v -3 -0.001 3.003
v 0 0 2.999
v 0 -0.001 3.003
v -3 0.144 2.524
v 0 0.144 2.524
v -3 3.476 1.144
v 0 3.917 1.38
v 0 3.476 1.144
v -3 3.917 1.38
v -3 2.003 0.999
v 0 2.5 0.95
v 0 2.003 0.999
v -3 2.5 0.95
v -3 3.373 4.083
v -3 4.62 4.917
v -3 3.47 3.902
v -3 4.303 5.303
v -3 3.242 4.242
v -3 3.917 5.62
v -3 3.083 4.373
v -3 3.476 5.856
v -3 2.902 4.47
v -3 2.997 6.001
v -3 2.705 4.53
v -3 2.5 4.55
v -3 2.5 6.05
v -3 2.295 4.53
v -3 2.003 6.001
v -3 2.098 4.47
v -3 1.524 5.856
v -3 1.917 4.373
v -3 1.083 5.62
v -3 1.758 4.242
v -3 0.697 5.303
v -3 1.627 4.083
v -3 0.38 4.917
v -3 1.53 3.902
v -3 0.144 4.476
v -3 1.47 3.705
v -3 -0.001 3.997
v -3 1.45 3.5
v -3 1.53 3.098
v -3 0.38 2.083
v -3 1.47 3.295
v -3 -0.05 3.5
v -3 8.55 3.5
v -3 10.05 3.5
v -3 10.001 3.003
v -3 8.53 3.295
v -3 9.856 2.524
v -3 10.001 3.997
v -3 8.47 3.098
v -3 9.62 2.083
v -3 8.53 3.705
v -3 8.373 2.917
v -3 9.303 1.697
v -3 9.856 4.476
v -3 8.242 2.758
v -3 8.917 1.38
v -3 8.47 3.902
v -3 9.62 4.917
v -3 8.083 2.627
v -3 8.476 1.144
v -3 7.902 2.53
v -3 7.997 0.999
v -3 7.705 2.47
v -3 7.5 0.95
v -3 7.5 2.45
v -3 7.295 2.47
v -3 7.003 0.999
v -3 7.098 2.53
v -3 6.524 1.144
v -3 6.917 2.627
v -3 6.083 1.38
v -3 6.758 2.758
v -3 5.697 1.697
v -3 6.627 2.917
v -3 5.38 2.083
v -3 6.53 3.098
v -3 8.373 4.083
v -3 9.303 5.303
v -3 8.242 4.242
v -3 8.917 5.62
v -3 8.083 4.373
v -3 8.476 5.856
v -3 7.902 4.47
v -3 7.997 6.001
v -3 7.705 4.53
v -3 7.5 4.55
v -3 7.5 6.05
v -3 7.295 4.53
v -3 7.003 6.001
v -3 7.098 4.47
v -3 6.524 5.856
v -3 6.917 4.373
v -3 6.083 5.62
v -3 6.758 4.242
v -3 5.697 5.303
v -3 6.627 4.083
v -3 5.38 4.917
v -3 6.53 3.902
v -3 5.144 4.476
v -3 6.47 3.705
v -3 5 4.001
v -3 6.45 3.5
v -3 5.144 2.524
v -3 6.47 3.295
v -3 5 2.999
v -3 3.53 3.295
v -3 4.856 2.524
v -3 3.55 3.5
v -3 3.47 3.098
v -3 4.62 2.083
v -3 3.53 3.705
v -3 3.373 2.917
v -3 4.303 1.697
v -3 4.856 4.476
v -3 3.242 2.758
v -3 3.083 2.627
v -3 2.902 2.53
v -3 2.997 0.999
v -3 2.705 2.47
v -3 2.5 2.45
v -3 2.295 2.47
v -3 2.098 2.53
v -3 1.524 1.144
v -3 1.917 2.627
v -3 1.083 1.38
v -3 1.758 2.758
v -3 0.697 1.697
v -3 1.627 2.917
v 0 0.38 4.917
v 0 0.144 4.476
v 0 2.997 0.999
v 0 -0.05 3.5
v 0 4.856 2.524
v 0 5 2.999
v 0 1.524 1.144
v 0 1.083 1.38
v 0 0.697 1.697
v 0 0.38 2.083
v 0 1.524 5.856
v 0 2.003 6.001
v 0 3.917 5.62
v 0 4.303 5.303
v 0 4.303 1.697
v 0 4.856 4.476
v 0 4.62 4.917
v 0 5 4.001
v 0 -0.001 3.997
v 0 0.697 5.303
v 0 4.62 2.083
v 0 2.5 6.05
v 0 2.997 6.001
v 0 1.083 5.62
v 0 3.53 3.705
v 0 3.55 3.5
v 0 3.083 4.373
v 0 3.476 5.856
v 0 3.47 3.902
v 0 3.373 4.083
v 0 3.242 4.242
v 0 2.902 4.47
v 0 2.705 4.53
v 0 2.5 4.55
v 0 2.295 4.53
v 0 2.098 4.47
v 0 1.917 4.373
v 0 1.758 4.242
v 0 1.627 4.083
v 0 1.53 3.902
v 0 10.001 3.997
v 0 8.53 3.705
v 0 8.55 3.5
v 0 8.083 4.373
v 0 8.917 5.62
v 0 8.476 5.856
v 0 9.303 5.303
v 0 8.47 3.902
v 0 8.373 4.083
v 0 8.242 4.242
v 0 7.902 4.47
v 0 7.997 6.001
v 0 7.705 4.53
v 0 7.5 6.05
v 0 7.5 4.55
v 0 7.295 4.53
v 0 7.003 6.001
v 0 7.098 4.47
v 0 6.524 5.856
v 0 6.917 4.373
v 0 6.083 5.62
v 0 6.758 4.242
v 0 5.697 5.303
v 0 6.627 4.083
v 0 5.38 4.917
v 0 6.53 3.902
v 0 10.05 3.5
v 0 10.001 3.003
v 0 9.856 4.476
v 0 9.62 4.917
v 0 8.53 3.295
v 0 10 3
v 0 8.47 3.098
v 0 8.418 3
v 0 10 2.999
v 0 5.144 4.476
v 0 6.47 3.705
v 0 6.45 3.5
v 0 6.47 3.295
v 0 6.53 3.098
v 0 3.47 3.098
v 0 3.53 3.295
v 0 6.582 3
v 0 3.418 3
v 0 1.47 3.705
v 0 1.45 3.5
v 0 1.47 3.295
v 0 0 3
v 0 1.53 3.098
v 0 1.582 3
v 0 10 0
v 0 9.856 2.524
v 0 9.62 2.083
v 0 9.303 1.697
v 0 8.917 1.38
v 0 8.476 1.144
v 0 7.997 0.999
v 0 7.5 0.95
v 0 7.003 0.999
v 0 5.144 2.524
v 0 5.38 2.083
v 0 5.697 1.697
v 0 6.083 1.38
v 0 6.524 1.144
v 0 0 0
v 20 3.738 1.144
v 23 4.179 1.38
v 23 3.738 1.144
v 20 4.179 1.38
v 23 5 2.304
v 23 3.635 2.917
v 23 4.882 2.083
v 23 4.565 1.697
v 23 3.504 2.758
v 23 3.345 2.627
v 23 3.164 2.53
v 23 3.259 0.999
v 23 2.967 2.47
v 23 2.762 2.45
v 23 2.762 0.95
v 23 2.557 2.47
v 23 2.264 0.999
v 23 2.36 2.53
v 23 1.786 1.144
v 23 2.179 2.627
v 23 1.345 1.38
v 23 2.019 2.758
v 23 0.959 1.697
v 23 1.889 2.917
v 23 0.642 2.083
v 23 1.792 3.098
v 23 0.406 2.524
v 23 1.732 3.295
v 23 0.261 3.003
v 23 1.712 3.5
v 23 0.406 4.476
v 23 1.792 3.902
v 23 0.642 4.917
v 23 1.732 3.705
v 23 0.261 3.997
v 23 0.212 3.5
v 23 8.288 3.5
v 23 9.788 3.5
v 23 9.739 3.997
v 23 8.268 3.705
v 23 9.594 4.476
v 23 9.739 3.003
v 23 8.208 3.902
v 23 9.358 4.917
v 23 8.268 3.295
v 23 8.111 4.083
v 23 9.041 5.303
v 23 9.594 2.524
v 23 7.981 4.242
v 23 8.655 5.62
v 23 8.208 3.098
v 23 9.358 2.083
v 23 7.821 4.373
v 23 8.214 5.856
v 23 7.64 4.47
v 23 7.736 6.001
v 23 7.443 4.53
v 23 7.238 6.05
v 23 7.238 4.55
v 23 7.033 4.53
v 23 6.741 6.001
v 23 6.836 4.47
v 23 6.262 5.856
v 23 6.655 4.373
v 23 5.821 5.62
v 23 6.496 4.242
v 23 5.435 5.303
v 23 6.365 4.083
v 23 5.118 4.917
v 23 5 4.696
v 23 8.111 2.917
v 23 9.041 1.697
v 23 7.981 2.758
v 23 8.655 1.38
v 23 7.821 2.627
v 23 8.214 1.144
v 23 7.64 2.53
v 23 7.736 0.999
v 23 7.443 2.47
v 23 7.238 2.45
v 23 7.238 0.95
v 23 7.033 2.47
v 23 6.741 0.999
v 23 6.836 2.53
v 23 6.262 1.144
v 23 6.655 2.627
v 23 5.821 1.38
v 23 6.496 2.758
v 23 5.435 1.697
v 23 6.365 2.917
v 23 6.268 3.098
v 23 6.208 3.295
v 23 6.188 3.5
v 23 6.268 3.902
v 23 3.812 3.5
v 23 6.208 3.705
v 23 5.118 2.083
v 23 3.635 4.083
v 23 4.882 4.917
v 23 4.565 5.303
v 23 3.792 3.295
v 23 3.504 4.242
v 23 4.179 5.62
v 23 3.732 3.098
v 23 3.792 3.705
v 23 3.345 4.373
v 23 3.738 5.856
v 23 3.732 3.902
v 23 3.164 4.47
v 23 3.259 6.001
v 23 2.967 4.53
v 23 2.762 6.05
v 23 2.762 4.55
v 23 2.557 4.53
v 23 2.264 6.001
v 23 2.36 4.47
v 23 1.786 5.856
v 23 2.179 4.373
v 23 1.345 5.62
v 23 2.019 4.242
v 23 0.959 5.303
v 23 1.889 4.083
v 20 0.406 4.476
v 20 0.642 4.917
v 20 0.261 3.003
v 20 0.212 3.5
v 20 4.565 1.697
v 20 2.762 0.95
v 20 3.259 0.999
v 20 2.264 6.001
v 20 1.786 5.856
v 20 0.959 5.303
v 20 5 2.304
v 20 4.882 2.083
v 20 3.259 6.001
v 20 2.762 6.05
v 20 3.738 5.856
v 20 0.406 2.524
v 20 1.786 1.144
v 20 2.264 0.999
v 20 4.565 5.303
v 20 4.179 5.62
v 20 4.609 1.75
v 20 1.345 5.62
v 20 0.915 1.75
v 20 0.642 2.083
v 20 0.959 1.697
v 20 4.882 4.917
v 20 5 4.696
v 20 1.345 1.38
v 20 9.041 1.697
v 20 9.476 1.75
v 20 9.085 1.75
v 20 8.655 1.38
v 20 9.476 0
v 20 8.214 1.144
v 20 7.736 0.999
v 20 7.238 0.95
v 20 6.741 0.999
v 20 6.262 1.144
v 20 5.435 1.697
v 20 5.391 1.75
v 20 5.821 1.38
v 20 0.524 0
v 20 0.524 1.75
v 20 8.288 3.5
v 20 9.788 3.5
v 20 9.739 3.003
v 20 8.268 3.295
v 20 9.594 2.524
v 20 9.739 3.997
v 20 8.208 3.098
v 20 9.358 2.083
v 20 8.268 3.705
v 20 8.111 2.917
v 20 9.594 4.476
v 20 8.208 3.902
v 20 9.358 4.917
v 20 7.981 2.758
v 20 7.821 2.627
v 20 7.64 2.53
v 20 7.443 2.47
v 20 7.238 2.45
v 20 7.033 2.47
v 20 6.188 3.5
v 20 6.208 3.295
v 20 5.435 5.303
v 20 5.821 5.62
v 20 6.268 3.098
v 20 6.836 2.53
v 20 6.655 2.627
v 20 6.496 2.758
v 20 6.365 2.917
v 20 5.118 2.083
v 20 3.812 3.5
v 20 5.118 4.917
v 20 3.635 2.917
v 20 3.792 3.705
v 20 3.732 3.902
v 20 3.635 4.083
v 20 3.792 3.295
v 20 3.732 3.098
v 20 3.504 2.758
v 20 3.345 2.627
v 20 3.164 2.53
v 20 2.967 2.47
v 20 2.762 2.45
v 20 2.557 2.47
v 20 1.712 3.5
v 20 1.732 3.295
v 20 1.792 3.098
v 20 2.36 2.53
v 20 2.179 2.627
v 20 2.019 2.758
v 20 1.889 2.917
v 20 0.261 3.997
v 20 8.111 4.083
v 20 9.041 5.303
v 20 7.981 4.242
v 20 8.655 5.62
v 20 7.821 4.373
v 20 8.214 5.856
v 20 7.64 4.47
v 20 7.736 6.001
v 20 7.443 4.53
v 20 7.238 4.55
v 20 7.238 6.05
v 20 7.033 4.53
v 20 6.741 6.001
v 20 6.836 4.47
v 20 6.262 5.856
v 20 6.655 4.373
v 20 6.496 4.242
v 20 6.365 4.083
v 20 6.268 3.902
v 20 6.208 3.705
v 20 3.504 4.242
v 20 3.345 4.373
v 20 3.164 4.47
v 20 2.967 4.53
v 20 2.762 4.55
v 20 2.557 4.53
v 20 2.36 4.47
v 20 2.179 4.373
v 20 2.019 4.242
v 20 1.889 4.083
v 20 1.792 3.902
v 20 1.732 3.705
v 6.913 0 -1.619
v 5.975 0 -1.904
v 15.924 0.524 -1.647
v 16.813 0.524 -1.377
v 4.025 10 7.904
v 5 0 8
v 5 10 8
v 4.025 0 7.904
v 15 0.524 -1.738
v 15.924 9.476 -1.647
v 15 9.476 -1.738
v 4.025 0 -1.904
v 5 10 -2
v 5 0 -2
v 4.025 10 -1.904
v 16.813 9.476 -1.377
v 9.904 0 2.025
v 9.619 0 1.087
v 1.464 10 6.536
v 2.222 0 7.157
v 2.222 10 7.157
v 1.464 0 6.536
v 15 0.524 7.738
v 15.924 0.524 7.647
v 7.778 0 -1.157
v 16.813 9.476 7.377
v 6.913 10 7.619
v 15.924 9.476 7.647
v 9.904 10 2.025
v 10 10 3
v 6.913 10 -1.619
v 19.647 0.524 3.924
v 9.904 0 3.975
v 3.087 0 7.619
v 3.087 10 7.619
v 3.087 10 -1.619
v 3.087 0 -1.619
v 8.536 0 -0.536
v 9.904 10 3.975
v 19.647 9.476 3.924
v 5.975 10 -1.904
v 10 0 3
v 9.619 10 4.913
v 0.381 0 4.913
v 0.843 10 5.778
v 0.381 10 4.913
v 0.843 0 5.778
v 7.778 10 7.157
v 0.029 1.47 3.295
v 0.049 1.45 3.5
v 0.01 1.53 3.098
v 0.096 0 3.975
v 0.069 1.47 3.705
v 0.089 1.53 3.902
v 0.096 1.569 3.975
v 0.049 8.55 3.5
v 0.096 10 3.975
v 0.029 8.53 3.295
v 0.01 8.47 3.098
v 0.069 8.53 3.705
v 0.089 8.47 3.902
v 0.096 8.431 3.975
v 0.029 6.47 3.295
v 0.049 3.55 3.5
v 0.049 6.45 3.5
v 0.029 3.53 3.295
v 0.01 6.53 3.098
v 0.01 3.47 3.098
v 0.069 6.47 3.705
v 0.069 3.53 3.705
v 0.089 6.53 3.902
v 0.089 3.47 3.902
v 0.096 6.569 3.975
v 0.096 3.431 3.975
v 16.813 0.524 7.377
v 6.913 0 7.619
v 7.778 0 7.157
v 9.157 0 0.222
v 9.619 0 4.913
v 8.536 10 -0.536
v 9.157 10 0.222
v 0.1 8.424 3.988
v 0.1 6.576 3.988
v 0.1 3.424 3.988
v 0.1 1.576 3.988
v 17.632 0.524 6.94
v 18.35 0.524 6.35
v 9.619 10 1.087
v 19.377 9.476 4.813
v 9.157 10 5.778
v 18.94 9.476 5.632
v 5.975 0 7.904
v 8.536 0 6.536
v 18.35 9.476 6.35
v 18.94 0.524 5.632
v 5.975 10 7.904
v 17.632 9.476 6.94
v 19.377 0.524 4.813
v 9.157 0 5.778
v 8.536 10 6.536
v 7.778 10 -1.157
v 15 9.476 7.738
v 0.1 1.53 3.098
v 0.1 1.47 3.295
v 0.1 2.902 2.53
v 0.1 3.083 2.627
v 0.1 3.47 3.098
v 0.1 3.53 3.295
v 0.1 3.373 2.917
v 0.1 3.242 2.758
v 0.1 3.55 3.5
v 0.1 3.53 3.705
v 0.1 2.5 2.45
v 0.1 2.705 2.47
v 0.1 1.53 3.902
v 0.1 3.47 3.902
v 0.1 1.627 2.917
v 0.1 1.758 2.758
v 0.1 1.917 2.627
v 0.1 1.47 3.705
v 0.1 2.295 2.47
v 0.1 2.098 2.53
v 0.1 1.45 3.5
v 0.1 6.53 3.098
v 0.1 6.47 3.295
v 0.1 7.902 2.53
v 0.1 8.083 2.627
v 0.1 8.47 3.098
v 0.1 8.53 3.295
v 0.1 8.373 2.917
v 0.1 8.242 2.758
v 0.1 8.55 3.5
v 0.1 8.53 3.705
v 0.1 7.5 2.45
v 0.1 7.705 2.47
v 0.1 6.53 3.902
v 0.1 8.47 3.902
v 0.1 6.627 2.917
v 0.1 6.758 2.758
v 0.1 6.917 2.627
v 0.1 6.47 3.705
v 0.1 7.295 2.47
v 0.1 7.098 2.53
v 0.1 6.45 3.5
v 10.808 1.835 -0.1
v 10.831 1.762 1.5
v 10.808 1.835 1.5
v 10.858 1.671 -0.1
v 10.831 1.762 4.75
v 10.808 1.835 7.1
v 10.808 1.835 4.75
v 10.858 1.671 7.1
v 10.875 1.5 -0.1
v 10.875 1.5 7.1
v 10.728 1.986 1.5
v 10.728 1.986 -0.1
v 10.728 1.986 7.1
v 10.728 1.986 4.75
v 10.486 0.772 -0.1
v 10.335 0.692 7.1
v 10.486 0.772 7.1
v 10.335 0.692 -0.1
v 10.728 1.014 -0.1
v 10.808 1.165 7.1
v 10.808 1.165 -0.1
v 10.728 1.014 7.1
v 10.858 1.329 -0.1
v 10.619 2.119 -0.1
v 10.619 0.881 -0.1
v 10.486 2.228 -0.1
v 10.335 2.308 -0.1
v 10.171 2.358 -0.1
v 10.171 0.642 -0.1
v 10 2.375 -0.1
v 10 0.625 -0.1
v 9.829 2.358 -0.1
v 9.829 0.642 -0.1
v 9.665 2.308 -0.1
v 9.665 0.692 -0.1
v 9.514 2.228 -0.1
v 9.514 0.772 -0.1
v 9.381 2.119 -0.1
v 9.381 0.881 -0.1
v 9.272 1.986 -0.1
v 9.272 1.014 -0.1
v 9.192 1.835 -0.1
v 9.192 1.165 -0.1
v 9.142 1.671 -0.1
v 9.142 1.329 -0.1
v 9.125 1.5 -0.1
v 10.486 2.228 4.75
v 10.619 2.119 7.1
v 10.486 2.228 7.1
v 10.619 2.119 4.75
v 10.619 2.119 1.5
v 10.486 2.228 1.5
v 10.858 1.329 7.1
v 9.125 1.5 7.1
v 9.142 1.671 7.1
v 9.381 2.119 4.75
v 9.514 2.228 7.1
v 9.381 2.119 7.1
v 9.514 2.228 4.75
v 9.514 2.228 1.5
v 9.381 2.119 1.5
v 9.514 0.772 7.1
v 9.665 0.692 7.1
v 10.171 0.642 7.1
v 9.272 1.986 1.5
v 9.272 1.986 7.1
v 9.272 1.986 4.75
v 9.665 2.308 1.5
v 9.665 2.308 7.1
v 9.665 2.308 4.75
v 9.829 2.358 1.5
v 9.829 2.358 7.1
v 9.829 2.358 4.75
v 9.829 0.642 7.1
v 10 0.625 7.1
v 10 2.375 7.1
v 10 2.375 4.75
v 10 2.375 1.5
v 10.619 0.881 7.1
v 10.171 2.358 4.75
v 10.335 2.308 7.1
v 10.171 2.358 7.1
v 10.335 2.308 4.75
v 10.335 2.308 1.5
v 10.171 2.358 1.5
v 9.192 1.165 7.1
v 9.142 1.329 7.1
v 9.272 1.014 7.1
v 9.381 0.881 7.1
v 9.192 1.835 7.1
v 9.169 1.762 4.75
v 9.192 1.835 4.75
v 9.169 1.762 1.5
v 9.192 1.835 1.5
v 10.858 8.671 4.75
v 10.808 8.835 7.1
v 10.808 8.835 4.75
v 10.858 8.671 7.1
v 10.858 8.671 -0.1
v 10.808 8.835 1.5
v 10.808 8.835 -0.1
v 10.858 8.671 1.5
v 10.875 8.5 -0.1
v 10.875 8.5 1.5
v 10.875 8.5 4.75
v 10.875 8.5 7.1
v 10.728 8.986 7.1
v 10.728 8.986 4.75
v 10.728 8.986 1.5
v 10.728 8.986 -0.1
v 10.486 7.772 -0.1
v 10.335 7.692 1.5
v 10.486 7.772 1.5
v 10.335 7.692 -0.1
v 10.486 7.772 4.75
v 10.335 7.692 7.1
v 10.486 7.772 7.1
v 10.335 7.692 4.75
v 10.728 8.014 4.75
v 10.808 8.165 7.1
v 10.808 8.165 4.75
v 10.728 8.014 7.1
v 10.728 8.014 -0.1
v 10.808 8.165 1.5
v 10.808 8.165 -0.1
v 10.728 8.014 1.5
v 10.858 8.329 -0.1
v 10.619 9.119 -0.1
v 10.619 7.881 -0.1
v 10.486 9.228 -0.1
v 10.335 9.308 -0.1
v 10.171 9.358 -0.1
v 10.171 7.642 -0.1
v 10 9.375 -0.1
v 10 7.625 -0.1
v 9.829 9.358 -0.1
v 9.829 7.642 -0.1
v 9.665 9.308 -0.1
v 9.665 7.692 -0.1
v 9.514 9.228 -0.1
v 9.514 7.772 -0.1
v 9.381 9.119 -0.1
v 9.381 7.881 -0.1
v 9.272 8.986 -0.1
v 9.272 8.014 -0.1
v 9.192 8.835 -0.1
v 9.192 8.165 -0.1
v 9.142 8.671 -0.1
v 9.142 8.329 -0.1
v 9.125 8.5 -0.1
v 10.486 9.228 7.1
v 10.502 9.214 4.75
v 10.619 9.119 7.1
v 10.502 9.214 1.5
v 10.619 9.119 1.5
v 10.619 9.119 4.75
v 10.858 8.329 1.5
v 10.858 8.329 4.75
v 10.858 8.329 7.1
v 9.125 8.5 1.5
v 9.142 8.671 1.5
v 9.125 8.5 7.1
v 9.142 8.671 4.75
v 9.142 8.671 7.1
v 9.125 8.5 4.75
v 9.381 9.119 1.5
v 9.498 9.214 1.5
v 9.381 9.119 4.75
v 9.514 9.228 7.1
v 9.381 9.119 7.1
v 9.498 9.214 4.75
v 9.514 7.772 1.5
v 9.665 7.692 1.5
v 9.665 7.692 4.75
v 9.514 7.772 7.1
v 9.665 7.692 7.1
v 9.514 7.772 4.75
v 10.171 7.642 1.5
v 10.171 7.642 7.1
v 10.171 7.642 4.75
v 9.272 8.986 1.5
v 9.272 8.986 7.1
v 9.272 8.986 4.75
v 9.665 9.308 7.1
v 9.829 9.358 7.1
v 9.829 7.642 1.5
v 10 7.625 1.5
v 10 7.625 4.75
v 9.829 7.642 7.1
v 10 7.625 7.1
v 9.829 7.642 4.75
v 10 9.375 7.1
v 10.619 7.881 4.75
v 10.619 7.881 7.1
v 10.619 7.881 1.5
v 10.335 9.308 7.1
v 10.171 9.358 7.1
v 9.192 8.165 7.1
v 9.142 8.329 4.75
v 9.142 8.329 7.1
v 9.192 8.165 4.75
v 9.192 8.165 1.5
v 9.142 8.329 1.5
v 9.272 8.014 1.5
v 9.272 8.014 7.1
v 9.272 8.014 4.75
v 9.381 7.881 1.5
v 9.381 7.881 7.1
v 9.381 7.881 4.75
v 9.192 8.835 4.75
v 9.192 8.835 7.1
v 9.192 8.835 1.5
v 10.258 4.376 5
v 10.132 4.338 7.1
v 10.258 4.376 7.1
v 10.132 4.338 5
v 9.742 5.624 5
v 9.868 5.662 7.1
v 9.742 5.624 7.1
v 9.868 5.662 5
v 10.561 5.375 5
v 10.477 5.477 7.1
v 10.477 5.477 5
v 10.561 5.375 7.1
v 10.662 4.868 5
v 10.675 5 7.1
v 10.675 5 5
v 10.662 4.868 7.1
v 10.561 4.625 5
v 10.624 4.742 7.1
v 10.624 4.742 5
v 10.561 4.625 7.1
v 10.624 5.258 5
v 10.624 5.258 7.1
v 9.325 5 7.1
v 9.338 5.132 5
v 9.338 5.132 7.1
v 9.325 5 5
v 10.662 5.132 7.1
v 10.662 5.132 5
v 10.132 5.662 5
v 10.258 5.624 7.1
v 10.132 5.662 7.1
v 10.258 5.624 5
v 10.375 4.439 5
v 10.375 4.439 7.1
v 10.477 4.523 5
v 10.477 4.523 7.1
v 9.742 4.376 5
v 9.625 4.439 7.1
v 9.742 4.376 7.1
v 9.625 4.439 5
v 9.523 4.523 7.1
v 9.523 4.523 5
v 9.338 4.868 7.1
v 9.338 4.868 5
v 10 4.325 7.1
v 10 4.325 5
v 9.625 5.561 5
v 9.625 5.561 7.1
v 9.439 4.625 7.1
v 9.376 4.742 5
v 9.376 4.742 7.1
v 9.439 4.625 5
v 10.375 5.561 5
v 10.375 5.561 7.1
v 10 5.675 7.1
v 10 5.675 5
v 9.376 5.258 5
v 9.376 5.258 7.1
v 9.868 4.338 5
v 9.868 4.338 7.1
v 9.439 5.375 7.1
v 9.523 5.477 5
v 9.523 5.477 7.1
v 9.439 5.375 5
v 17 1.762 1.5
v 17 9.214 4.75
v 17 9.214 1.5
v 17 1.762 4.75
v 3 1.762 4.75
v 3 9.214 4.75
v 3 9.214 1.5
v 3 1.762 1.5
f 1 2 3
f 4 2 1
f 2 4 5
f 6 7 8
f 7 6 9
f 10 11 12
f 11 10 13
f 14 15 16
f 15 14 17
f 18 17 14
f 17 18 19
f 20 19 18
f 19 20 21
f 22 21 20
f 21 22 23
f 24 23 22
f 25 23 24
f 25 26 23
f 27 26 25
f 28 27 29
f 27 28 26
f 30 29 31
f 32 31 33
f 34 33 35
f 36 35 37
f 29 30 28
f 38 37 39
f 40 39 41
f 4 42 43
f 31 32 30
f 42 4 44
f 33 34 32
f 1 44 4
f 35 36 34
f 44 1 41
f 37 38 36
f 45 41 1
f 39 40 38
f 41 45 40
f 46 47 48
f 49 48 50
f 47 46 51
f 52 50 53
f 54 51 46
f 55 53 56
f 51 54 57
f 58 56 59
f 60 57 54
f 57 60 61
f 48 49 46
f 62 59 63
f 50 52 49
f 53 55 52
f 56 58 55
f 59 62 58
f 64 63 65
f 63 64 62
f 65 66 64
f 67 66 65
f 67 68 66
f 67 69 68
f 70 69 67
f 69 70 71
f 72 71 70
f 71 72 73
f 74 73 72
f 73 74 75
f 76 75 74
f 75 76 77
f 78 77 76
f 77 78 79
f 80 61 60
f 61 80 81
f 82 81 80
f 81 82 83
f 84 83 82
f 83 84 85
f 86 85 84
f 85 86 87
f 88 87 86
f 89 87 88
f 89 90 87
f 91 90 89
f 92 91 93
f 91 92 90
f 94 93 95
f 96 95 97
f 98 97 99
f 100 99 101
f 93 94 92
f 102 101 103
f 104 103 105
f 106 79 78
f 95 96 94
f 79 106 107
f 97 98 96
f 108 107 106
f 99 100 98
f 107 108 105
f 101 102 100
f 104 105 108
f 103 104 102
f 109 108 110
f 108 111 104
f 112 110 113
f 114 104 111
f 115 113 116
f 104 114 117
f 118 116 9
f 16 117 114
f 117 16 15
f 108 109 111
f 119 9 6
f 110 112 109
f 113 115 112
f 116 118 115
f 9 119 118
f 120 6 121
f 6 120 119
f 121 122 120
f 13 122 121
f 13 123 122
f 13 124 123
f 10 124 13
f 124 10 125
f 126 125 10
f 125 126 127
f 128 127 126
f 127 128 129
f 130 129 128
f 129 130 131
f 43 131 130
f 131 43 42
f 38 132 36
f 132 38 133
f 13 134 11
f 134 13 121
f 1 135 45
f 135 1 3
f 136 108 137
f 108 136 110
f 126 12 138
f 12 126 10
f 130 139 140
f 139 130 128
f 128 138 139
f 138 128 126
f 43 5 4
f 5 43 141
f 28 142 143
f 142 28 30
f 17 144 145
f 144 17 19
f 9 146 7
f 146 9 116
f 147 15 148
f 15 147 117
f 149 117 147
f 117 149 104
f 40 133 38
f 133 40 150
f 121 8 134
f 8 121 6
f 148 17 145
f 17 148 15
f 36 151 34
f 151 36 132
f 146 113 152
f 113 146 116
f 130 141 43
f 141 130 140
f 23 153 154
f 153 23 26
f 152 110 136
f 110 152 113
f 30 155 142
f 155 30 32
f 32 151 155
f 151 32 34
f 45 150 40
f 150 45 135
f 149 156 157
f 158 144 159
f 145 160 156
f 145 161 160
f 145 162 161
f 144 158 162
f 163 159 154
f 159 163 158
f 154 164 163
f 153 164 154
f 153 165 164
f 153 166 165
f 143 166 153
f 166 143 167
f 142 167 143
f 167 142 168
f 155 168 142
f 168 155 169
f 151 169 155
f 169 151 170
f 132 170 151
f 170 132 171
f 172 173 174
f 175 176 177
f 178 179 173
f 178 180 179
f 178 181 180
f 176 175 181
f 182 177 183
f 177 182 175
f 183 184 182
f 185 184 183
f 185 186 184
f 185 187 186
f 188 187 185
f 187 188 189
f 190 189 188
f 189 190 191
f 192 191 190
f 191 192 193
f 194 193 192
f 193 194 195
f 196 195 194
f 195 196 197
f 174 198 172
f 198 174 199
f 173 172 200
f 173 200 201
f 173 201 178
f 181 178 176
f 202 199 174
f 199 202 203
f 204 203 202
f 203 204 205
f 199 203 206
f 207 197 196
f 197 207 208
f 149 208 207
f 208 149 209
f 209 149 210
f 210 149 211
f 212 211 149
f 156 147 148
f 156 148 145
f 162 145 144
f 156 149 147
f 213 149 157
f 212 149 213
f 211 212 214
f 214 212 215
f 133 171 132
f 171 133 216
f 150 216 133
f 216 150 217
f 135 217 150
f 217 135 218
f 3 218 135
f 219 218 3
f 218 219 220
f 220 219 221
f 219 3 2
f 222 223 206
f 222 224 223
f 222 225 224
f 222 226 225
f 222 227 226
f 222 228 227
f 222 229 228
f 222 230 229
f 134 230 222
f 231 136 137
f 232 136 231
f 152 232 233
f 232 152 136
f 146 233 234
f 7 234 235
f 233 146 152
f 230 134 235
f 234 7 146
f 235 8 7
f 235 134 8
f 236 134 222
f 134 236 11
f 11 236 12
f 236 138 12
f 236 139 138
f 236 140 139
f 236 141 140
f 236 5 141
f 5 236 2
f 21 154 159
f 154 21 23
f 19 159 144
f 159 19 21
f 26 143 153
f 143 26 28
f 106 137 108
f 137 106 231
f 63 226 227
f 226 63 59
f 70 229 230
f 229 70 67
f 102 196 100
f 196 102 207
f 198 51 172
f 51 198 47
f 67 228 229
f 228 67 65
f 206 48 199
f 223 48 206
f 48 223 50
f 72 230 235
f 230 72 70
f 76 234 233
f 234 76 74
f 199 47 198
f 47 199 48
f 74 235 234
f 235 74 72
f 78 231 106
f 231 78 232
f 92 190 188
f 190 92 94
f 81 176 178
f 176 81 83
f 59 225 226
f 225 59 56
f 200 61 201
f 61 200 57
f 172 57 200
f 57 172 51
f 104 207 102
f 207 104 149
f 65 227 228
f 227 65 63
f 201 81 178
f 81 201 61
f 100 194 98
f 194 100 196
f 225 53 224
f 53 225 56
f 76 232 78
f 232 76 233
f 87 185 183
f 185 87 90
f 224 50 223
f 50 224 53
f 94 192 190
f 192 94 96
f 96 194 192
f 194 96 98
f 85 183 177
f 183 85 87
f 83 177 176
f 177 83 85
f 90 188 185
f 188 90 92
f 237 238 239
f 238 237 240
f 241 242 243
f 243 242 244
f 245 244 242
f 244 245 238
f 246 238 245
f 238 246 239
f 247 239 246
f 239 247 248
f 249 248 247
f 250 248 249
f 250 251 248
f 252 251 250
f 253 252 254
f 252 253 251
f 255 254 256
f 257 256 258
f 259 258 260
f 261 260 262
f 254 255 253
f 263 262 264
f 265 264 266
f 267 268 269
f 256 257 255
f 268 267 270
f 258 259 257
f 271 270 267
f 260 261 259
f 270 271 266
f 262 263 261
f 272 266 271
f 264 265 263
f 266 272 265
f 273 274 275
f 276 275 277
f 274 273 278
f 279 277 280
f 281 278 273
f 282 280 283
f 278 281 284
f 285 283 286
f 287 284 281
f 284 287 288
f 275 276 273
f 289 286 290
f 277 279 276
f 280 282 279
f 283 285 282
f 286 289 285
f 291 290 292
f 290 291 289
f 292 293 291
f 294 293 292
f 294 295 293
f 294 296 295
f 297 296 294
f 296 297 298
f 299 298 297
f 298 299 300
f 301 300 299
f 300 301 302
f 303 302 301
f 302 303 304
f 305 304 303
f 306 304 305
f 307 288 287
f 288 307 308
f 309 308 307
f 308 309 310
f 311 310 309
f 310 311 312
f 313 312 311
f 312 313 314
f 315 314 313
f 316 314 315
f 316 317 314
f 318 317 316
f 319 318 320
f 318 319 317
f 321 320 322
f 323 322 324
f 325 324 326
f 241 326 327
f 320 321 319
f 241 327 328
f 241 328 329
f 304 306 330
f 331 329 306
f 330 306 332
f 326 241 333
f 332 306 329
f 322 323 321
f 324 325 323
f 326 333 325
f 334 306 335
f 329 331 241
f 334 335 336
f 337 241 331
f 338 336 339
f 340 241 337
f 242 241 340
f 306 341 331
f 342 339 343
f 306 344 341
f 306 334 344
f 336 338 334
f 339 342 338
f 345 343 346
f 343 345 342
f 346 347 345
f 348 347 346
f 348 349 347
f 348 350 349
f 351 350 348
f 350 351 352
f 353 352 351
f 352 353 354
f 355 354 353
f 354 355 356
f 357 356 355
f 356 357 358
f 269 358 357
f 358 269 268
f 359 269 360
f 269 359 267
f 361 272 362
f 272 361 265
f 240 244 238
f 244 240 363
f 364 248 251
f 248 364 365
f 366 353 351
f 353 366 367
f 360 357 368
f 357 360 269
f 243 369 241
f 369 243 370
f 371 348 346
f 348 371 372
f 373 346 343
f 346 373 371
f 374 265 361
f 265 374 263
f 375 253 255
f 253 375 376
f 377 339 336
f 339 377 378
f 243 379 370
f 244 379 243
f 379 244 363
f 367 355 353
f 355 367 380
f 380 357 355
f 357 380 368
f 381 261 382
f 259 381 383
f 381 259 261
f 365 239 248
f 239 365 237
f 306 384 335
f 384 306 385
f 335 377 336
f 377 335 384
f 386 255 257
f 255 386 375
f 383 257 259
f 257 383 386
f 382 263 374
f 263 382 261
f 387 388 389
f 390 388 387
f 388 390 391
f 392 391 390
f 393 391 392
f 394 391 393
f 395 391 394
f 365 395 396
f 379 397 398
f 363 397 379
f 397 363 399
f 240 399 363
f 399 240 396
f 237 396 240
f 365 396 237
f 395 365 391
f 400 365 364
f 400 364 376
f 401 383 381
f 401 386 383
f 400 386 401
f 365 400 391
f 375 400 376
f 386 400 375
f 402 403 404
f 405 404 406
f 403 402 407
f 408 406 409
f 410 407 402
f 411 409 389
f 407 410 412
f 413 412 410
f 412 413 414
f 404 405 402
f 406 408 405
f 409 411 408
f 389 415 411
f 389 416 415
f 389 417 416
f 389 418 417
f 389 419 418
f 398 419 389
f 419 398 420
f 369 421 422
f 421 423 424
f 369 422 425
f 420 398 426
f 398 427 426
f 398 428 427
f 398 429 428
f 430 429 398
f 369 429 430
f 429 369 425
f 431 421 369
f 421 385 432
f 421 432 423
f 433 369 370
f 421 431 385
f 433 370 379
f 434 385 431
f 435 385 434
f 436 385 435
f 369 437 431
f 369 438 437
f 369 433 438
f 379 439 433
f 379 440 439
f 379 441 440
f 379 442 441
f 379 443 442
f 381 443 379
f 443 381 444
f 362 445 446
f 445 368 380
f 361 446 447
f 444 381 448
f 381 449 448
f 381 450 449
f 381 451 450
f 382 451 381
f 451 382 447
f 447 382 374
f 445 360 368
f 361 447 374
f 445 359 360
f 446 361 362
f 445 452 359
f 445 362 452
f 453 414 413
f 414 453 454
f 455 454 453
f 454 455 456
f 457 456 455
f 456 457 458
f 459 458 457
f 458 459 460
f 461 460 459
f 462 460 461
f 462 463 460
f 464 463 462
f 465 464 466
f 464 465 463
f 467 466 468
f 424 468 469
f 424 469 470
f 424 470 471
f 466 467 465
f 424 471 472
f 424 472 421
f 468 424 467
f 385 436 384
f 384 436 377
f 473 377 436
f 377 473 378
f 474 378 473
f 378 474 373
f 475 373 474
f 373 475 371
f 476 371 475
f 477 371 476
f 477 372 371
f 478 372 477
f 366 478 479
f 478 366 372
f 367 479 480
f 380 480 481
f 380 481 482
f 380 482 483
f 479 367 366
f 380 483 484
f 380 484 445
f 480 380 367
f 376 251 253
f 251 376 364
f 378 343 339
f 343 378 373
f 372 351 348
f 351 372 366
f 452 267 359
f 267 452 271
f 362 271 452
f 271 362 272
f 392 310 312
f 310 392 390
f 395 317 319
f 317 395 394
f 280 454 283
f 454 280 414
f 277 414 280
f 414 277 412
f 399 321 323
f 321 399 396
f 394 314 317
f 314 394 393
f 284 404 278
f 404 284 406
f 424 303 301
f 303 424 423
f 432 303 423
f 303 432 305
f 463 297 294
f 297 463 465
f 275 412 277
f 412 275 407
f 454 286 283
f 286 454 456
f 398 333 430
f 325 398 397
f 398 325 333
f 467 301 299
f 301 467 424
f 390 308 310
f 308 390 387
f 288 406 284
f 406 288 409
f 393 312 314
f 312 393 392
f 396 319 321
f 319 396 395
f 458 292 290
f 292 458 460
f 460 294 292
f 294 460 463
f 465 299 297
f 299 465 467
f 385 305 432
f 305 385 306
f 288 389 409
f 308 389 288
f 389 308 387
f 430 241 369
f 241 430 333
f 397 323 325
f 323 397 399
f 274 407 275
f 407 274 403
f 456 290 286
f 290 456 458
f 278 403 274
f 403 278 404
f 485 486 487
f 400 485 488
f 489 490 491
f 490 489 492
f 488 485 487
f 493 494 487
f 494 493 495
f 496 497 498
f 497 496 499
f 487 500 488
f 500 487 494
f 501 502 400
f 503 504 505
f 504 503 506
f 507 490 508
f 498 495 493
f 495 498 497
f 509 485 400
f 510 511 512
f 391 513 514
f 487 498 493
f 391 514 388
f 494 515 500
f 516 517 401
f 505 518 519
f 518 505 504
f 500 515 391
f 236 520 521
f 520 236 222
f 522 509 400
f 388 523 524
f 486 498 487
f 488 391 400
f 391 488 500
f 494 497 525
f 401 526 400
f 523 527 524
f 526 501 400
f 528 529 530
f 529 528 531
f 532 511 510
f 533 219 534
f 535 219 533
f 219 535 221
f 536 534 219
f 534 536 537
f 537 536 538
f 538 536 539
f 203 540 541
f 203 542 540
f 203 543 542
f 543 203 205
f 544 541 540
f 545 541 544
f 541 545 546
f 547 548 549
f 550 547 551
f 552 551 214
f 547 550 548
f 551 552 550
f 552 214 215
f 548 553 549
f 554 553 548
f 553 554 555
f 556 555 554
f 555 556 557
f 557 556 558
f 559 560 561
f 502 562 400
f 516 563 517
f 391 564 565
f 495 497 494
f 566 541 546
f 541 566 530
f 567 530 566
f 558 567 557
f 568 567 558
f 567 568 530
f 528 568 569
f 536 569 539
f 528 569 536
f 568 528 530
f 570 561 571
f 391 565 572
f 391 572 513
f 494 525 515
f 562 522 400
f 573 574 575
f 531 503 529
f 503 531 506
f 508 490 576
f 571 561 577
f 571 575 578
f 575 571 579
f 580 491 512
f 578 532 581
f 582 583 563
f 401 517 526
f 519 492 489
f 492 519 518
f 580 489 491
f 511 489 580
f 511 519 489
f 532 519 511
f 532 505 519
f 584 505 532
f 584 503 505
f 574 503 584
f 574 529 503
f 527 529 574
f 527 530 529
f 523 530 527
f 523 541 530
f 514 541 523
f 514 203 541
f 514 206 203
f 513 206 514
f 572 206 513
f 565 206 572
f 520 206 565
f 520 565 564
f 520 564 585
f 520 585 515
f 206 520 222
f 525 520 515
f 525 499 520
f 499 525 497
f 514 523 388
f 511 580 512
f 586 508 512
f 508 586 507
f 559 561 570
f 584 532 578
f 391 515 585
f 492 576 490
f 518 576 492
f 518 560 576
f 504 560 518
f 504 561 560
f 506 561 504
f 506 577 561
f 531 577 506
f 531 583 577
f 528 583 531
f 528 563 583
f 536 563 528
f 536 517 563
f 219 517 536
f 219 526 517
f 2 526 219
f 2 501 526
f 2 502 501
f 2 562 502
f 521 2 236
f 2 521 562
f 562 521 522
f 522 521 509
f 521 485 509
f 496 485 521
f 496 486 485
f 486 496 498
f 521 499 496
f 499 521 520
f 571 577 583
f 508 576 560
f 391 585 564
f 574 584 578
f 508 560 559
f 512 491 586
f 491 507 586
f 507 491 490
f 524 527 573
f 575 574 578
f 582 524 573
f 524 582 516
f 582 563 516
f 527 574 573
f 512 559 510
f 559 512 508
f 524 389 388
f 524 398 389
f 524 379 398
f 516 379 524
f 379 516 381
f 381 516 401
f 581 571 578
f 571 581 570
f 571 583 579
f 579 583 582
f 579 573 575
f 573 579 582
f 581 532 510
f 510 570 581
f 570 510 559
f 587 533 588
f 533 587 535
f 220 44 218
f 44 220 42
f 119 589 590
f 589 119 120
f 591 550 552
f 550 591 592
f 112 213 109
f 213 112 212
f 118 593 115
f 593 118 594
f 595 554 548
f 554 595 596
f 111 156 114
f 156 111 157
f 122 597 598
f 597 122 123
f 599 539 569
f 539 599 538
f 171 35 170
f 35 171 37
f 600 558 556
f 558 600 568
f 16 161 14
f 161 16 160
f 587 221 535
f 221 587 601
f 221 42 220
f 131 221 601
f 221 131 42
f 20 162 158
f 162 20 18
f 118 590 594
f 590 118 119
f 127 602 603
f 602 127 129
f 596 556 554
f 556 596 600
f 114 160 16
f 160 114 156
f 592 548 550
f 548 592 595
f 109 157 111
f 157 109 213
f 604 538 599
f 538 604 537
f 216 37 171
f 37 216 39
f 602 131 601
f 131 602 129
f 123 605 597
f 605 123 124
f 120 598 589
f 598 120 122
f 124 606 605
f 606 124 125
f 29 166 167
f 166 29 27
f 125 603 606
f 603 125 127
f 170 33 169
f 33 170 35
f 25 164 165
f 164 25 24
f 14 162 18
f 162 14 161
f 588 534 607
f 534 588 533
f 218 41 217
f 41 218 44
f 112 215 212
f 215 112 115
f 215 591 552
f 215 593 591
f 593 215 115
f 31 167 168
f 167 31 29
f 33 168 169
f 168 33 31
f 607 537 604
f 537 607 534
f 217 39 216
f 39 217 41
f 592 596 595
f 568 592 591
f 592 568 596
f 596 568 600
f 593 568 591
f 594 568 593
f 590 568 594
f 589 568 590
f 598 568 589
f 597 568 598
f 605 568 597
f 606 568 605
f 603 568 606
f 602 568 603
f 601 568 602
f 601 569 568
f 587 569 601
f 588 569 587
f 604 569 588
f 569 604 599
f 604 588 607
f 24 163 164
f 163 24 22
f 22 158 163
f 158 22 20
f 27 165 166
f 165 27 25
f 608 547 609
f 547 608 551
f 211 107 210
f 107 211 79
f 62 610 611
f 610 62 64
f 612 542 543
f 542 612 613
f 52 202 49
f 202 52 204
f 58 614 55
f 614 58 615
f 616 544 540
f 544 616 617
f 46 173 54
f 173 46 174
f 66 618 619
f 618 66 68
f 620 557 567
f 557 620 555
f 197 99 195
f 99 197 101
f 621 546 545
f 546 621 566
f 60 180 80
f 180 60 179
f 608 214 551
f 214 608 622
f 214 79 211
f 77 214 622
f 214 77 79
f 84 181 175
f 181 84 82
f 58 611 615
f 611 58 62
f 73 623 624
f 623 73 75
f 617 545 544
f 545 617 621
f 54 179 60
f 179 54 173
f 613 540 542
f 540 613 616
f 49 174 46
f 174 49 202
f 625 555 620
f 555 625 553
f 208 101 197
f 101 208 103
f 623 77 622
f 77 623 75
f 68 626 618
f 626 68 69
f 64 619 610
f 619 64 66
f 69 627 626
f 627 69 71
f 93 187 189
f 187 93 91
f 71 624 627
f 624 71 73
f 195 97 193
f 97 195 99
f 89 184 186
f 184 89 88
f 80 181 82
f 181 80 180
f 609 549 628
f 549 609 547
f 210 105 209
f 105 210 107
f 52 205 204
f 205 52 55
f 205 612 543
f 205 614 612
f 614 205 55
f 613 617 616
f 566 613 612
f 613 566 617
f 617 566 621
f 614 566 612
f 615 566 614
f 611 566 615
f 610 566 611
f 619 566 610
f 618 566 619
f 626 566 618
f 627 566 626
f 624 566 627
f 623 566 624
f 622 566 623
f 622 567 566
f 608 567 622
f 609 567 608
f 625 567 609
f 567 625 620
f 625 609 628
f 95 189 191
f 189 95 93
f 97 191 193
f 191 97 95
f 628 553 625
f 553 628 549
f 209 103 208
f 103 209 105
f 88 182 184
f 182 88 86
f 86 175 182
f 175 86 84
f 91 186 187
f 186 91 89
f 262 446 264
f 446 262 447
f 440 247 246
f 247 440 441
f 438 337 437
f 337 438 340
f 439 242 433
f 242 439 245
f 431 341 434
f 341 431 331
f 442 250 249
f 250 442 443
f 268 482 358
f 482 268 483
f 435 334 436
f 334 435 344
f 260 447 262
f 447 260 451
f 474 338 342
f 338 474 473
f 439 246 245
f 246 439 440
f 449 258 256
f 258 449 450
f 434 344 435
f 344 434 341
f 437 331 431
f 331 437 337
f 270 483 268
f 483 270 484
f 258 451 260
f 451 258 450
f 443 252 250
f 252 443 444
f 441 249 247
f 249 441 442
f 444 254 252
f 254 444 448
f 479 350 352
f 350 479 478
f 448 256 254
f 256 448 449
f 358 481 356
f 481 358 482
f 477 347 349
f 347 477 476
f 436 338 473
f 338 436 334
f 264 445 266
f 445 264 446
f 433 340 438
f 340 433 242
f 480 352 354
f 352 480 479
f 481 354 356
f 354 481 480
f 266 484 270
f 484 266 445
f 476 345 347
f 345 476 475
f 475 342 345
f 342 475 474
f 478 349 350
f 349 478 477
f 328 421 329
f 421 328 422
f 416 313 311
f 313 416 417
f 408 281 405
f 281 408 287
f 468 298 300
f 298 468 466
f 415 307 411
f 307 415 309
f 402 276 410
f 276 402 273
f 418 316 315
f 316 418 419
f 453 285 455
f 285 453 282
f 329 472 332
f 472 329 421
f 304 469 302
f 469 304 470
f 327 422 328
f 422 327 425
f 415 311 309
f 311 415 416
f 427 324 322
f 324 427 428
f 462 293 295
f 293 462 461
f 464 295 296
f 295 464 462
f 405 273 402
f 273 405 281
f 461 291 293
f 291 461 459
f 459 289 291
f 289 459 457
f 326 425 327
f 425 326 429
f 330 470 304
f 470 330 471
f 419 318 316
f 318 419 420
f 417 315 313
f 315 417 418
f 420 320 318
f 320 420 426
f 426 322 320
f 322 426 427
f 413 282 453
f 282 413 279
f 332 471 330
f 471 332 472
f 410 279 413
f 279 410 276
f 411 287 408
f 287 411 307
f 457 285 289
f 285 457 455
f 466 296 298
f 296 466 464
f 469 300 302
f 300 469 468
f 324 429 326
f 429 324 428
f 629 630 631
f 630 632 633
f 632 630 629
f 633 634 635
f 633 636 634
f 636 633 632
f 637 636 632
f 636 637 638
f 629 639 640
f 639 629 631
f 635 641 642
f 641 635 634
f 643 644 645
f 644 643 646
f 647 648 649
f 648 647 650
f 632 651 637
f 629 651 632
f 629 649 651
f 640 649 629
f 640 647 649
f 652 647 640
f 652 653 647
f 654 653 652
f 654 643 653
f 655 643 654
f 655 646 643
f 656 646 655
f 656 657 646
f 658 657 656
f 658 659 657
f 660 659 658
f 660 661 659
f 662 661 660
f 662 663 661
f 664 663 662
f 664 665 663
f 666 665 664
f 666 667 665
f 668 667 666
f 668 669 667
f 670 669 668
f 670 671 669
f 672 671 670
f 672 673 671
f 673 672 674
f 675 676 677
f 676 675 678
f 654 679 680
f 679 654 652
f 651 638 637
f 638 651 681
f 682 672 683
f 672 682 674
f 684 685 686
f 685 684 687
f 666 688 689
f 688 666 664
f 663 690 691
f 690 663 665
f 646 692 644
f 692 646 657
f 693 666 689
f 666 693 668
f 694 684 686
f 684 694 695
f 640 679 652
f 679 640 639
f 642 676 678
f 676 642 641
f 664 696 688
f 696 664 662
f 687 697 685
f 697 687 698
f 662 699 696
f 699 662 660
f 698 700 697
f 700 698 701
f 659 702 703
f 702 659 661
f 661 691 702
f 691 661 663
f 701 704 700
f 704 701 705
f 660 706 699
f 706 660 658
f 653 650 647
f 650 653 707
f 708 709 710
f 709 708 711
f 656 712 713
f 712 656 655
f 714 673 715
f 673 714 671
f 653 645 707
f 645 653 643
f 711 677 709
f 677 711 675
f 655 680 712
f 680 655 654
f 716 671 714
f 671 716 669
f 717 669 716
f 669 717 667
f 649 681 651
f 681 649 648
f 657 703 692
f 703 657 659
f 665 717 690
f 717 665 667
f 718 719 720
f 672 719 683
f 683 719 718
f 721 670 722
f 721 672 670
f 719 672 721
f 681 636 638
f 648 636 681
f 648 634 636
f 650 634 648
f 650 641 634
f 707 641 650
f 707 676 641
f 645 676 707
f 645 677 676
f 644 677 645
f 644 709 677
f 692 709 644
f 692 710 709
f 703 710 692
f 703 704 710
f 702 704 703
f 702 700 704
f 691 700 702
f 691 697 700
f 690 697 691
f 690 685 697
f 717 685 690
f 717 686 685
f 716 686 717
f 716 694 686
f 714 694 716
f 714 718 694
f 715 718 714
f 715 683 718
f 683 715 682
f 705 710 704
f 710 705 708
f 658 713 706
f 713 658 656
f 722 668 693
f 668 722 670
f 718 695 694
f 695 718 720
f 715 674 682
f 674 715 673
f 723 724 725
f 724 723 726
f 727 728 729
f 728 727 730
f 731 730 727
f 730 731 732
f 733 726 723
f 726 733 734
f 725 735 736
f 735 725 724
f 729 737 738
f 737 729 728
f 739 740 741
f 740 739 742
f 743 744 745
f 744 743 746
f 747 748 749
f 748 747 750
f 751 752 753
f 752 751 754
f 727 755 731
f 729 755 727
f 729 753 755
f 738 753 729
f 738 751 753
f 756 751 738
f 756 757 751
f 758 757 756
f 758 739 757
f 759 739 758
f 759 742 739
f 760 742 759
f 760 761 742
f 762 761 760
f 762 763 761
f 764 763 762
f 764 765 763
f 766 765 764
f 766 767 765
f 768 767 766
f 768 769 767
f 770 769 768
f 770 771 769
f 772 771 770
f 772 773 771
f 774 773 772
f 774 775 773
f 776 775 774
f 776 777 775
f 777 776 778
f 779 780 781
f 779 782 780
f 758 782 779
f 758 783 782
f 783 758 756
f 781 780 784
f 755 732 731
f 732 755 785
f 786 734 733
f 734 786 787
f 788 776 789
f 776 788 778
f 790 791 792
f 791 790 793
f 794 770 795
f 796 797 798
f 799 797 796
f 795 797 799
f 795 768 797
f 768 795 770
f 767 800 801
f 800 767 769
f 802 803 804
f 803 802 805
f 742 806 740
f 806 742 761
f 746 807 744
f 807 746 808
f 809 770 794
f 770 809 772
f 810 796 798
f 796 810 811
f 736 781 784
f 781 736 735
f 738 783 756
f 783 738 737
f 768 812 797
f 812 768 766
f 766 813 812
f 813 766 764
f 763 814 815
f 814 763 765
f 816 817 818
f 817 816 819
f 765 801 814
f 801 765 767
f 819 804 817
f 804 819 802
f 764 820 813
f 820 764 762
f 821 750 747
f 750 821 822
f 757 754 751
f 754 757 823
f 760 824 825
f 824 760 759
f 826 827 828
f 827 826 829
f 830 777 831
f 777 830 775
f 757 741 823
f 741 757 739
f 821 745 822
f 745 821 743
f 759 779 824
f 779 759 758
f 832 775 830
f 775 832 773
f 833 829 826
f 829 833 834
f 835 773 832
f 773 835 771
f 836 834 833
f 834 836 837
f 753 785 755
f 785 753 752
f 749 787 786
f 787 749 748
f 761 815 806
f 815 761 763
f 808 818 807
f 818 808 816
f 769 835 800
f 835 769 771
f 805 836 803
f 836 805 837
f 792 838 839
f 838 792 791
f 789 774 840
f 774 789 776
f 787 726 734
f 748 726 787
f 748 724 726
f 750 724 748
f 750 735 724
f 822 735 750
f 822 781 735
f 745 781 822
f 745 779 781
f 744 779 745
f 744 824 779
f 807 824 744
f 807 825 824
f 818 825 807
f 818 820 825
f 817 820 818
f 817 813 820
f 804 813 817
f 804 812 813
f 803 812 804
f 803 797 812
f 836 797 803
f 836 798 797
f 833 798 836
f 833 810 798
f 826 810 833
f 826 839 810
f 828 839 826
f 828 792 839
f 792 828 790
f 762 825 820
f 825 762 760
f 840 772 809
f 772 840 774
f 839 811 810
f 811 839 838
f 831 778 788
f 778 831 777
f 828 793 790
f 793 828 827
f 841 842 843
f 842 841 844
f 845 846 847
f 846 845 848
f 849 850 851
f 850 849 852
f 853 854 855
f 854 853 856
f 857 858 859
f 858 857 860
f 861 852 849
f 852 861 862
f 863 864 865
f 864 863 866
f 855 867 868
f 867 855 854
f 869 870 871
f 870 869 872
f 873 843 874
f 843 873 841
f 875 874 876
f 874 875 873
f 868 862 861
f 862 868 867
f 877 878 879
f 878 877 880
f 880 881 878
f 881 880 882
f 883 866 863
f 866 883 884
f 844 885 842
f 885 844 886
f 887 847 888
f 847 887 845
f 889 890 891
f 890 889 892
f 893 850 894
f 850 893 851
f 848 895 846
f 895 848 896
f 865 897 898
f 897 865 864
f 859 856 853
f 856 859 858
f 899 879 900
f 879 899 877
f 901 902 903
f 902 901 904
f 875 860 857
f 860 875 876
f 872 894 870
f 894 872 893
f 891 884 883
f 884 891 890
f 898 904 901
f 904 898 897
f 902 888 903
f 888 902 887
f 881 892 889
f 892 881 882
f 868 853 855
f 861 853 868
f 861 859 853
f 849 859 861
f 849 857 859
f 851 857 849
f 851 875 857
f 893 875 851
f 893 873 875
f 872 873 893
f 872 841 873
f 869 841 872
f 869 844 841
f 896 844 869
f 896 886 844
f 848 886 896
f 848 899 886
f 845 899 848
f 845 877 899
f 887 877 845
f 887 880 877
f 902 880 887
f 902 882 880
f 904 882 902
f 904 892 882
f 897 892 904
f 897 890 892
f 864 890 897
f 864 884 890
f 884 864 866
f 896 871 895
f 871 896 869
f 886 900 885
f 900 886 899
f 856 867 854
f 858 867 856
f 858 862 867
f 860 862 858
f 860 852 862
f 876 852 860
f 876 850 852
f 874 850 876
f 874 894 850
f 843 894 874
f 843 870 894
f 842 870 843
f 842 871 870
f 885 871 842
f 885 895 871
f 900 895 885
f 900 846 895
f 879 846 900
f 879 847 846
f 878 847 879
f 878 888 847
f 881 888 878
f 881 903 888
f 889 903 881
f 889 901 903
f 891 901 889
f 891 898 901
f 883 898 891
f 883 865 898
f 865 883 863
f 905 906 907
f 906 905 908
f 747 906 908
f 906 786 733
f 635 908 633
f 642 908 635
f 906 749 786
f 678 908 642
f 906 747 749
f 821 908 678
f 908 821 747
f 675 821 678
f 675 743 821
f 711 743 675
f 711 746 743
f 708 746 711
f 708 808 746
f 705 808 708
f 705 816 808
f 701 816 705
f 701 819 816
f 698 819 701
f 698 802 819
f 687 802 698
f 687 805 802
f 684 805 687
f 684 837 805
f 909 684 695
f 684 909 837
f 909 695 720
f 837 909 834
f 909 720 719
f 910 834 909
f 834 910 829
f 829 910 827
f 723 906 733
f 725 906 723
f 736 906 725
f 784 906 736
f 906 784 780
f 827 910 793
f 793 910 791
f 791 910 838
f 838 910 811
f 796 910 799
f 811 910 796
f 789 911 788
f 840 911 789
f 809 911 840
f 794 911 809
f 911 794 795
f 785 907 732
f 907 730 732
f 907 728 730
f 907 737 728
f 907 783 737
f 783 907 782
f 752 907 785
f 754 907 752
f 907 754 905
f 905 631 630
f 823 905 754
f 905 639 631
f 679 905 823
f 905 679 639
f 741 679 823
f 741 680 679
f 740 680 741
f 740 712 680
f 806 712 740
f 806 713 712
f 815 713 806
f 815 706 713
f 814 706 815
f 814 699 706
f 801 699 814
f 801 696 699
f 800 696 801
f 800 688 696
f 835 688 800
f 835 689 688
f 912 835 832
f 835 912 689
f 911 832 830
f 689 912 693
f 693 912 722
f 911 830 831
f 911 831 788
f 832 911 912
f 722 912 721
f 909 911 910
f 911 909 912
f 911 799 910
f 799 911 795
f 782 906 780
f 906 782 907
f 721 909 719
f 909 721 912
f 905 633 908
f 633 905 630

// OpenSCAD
// ============================================================
// finger_segment_distal.scad
// Distal Finger Segment – second-to-last, before fingertip
// Slightly tapered (1–2° taper angle)
//
// Print Settings:
//   Material:    PLA
//   Infill:      15%
//   Layer height: 0.2 mm
//   Supports:    None required
//   Weight:      ~2.5 g
//   Print time:  ~2 minutes
// ============================================================

$fn = 32;
$fa = 6;
$fs = 1;

// --- Parametric Variables ---
length                = 20;   // mm  segment length
width                 = 10;   // mm  proximal-end width
thickness             = 7;    // mm  segment thickness
hinge_pin_diameter    = 2;    // mm
hinge_pin_bore        = 2.1;  // mm  (0.1 mm tolerance)
tendon_hole_diameter  = 1.35; // mm
elastic_hole_diameter = 1.75; // mm
elastic_hole_spacing  = 7;    // mm
outer_radius          = 5;    // mm
taper_angle           = 1.5;  // degrees  side taper
wall_min              = 1.5;  // mm

// Derived
taper_offset     = length * tan(taper_angle);
distal_width     = width - 2 * taper_offset;
hinge_boss_od    = hinge_pin_bore + wall_min * 2;
hinge_boss_depth = 3.0;

// ============================================================
// Module: segment_body_distal
// Tapered body geometry
// ============================================================
module segment_body_distal() {
    hull() {
        // Proximal end (full width)
        cube([2, width, thickness / 4]);
        translate([outer_radius, width / 2, thickness - outer_radius + 1])
            rotate([90, 0, 0])
                cylinder(r = outer_radius, h = width, center = true);
        // Distal end (tapered width)
        translate([length - 2, taper_offset, 0])
            cube([2, distal_width, thickness / 4]);
        translate([length - outer_radius,
                   width / 2,
                   thickness - outer_radius + 1])
            rotate([90, 0, 0])
                cylinder(r = outer_radius - taper_offset / 2,
                         h = distal_width, center = true);
    }
}

// ============================================================
// Module: finger_segment_distal
// ============================================================
module finger_segment_distal() {
    difference() {
        union() {
            segment_body_distal();
            // Proximal hinge bosses
            for (y_pos = [width * 0.25, width * 0.75])
                translate([-hinge_boss_depth, y_pos, thickness / 2])
                    rotate([0, 90, 0])
                        cylinder(d = hinge_boss_od, h = hinge_boss_depth);
            // Distal hinge bosses (narrower due to taper)
            for (y_pos = [taper_offset + distal_width * 0.25,
                          taper_offset + distal_width * 0.75])
                translate([length, y_pos, thickness / 2])
                    rotate([0, 90, 0])
                        cylinder(d = hinge_boss_od, h = hinge_boss_depth);
        }
        // Proximal hinge bores
        for (y_pos = [width * 0.25, width * 0.75])
            translate([-hinge_boss_depth - 0.1, y_pos, thickness / 2])
                rotate([0, 90, 0])
                    cylinder(d = hinge_pin_bore, h = hinge_boss_depth + 0.2);
        // Distal hinge bores
        for (y_pos = [taper_offset + distal_width * 0.25,
                      taper_offset + distal_width * 0.75])
            translate([length - 0.1, y_pos, thickness / 2])
                rotate([0, 90, 0])
                    cylinder(d = hinge_pin_bore, h = hinge_boss_depth + 0.2);
        // Tendon hole (top face)
        translate([length / 2, width / 2, thickness - 2])
            cylinder(d = tendon_hole_diameter, h = 2.1);
        // Elastic holes (bottom face)
        for (dy = [-elastic_hole_spacing / 2, elastic_hole_spacing / 2])
            translate([length / 2, width / 2 + dy, -0.1])
                cylinder(d = elastic_hole_diameter, h = thickness + 0.2);
        // Internal lightening
        translate([wall_min * 2, wall_min + taper_offset / 2, wall_min])
            cube([length - wall_min * 4,
                  distal_width - wall_min,
                  thickness - wall_min * 2.5]);
    }
}

// ============================================================
// Render
// ============================================================
color("CornflowerBlue")
    finger_segment_distal();
